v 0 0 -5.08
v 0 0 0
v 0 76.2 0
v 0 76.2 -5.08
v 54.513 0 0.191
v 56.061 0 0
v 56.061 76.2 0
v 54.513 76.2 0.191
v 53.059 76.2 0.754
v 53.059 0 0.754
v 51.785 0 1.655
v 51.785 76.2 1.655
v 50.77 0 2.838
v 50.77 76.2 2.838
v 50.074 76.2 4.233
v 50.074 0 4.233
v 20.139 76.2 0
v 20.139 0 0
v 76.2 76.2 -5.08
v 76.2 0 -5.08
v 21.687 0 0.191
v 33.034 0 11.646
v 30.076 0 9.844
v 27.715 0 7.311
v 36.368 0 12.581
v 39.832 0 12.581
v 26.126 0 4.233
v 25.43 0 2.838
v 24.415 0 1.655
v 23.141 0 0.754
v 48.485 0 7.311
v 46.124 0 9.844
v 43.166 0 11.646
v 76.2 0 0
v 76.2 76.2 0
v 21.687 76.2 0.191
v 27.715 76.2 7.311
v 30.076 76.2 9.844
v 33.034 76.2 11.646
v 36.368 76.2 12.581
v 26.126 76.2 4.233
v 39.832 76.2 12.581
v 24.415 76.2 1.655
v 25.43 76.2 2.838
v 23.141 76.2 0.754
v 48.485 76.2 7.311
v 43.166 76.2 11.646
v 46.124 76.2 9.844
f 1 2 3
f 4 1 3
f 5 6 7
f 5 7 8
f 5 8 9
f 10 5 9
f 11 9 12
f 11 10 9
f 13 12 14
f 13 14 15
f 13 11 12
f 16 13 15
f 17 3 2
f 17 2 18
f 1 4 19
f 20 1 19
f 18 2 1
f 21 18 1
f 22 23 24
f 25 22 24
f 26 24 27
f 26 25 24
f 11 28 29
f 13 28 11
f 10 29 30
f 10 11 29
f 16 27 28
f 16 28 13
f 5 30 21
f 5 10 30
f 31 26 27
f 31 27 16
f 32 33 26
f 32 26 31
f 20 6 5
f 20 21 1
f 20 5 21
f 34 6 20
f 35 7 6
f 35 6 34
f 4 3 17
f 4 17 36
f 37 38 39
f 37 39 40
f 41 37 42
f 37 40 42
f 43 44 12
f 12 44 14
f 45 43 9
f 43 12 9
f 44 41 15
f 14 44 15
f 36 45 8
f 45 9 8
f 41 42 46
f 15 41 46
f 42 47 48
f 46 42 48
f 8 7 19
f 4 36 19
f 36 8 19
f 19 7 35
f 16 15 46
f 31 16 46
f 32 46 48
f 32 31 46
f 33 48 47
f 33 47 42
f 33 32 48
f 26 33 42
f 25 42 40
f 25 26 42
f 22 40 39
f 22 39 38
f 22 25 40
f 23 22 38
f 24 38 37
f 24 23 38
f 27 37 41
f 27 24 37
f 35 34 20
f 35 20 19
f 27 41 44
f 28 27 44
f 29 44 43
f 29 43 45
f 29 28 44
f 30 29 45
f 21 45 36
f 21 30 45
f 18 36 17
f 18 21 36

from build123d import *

# Parameters (mm, degrees)
F0_W     = 76.2
F0_H     = 76.2
F1_DEPTH = 5.08
F3_DEPTH = 76.2
F4_ANGLE = -90


with BuildPart() as f1:
    # F0 (on Front) → F1 (new body)
    with BuildSketch(Plane.XZ):
        with Locations((38.1, 38.1)):
            Rectangle(F0_W, F0_H)
    extrude(amount=-F1_DEPTH)

    # F2 (on face) → F3 (join)
    with BuildSketch(Plane(origin=(0, 0, 0), x_dir=(1, 0, 0), z_dir=(0, 0, -1))):
        with BuildLine():
            ThreePointArc((56.0605122421, 0), (52.3943380328, 1.1652467111), (50.0736748281, 4.2333333333))
            ThreePointArc((50.0736748281, 4.2333333333), (38.1, 12.7), (26.1263251719, 4.2333333333))
            ThreePointArc((26.1263251719, 4.2333333333), (23.8056619672, 1.1652467111), (20.1394877579, 0))
            Line((20.1394877579, 0), (56.0605122421, 0))
        make_face()
    extrude(amount=-F3_DEPTH)


with BuildPart() as f1_1:
    # F4: moved
    add(f1.part.rotate(Axis((10.0697438789, 0, 0), (1, 0, 0)), F4_ANGLE))


solid = f1_1.part
